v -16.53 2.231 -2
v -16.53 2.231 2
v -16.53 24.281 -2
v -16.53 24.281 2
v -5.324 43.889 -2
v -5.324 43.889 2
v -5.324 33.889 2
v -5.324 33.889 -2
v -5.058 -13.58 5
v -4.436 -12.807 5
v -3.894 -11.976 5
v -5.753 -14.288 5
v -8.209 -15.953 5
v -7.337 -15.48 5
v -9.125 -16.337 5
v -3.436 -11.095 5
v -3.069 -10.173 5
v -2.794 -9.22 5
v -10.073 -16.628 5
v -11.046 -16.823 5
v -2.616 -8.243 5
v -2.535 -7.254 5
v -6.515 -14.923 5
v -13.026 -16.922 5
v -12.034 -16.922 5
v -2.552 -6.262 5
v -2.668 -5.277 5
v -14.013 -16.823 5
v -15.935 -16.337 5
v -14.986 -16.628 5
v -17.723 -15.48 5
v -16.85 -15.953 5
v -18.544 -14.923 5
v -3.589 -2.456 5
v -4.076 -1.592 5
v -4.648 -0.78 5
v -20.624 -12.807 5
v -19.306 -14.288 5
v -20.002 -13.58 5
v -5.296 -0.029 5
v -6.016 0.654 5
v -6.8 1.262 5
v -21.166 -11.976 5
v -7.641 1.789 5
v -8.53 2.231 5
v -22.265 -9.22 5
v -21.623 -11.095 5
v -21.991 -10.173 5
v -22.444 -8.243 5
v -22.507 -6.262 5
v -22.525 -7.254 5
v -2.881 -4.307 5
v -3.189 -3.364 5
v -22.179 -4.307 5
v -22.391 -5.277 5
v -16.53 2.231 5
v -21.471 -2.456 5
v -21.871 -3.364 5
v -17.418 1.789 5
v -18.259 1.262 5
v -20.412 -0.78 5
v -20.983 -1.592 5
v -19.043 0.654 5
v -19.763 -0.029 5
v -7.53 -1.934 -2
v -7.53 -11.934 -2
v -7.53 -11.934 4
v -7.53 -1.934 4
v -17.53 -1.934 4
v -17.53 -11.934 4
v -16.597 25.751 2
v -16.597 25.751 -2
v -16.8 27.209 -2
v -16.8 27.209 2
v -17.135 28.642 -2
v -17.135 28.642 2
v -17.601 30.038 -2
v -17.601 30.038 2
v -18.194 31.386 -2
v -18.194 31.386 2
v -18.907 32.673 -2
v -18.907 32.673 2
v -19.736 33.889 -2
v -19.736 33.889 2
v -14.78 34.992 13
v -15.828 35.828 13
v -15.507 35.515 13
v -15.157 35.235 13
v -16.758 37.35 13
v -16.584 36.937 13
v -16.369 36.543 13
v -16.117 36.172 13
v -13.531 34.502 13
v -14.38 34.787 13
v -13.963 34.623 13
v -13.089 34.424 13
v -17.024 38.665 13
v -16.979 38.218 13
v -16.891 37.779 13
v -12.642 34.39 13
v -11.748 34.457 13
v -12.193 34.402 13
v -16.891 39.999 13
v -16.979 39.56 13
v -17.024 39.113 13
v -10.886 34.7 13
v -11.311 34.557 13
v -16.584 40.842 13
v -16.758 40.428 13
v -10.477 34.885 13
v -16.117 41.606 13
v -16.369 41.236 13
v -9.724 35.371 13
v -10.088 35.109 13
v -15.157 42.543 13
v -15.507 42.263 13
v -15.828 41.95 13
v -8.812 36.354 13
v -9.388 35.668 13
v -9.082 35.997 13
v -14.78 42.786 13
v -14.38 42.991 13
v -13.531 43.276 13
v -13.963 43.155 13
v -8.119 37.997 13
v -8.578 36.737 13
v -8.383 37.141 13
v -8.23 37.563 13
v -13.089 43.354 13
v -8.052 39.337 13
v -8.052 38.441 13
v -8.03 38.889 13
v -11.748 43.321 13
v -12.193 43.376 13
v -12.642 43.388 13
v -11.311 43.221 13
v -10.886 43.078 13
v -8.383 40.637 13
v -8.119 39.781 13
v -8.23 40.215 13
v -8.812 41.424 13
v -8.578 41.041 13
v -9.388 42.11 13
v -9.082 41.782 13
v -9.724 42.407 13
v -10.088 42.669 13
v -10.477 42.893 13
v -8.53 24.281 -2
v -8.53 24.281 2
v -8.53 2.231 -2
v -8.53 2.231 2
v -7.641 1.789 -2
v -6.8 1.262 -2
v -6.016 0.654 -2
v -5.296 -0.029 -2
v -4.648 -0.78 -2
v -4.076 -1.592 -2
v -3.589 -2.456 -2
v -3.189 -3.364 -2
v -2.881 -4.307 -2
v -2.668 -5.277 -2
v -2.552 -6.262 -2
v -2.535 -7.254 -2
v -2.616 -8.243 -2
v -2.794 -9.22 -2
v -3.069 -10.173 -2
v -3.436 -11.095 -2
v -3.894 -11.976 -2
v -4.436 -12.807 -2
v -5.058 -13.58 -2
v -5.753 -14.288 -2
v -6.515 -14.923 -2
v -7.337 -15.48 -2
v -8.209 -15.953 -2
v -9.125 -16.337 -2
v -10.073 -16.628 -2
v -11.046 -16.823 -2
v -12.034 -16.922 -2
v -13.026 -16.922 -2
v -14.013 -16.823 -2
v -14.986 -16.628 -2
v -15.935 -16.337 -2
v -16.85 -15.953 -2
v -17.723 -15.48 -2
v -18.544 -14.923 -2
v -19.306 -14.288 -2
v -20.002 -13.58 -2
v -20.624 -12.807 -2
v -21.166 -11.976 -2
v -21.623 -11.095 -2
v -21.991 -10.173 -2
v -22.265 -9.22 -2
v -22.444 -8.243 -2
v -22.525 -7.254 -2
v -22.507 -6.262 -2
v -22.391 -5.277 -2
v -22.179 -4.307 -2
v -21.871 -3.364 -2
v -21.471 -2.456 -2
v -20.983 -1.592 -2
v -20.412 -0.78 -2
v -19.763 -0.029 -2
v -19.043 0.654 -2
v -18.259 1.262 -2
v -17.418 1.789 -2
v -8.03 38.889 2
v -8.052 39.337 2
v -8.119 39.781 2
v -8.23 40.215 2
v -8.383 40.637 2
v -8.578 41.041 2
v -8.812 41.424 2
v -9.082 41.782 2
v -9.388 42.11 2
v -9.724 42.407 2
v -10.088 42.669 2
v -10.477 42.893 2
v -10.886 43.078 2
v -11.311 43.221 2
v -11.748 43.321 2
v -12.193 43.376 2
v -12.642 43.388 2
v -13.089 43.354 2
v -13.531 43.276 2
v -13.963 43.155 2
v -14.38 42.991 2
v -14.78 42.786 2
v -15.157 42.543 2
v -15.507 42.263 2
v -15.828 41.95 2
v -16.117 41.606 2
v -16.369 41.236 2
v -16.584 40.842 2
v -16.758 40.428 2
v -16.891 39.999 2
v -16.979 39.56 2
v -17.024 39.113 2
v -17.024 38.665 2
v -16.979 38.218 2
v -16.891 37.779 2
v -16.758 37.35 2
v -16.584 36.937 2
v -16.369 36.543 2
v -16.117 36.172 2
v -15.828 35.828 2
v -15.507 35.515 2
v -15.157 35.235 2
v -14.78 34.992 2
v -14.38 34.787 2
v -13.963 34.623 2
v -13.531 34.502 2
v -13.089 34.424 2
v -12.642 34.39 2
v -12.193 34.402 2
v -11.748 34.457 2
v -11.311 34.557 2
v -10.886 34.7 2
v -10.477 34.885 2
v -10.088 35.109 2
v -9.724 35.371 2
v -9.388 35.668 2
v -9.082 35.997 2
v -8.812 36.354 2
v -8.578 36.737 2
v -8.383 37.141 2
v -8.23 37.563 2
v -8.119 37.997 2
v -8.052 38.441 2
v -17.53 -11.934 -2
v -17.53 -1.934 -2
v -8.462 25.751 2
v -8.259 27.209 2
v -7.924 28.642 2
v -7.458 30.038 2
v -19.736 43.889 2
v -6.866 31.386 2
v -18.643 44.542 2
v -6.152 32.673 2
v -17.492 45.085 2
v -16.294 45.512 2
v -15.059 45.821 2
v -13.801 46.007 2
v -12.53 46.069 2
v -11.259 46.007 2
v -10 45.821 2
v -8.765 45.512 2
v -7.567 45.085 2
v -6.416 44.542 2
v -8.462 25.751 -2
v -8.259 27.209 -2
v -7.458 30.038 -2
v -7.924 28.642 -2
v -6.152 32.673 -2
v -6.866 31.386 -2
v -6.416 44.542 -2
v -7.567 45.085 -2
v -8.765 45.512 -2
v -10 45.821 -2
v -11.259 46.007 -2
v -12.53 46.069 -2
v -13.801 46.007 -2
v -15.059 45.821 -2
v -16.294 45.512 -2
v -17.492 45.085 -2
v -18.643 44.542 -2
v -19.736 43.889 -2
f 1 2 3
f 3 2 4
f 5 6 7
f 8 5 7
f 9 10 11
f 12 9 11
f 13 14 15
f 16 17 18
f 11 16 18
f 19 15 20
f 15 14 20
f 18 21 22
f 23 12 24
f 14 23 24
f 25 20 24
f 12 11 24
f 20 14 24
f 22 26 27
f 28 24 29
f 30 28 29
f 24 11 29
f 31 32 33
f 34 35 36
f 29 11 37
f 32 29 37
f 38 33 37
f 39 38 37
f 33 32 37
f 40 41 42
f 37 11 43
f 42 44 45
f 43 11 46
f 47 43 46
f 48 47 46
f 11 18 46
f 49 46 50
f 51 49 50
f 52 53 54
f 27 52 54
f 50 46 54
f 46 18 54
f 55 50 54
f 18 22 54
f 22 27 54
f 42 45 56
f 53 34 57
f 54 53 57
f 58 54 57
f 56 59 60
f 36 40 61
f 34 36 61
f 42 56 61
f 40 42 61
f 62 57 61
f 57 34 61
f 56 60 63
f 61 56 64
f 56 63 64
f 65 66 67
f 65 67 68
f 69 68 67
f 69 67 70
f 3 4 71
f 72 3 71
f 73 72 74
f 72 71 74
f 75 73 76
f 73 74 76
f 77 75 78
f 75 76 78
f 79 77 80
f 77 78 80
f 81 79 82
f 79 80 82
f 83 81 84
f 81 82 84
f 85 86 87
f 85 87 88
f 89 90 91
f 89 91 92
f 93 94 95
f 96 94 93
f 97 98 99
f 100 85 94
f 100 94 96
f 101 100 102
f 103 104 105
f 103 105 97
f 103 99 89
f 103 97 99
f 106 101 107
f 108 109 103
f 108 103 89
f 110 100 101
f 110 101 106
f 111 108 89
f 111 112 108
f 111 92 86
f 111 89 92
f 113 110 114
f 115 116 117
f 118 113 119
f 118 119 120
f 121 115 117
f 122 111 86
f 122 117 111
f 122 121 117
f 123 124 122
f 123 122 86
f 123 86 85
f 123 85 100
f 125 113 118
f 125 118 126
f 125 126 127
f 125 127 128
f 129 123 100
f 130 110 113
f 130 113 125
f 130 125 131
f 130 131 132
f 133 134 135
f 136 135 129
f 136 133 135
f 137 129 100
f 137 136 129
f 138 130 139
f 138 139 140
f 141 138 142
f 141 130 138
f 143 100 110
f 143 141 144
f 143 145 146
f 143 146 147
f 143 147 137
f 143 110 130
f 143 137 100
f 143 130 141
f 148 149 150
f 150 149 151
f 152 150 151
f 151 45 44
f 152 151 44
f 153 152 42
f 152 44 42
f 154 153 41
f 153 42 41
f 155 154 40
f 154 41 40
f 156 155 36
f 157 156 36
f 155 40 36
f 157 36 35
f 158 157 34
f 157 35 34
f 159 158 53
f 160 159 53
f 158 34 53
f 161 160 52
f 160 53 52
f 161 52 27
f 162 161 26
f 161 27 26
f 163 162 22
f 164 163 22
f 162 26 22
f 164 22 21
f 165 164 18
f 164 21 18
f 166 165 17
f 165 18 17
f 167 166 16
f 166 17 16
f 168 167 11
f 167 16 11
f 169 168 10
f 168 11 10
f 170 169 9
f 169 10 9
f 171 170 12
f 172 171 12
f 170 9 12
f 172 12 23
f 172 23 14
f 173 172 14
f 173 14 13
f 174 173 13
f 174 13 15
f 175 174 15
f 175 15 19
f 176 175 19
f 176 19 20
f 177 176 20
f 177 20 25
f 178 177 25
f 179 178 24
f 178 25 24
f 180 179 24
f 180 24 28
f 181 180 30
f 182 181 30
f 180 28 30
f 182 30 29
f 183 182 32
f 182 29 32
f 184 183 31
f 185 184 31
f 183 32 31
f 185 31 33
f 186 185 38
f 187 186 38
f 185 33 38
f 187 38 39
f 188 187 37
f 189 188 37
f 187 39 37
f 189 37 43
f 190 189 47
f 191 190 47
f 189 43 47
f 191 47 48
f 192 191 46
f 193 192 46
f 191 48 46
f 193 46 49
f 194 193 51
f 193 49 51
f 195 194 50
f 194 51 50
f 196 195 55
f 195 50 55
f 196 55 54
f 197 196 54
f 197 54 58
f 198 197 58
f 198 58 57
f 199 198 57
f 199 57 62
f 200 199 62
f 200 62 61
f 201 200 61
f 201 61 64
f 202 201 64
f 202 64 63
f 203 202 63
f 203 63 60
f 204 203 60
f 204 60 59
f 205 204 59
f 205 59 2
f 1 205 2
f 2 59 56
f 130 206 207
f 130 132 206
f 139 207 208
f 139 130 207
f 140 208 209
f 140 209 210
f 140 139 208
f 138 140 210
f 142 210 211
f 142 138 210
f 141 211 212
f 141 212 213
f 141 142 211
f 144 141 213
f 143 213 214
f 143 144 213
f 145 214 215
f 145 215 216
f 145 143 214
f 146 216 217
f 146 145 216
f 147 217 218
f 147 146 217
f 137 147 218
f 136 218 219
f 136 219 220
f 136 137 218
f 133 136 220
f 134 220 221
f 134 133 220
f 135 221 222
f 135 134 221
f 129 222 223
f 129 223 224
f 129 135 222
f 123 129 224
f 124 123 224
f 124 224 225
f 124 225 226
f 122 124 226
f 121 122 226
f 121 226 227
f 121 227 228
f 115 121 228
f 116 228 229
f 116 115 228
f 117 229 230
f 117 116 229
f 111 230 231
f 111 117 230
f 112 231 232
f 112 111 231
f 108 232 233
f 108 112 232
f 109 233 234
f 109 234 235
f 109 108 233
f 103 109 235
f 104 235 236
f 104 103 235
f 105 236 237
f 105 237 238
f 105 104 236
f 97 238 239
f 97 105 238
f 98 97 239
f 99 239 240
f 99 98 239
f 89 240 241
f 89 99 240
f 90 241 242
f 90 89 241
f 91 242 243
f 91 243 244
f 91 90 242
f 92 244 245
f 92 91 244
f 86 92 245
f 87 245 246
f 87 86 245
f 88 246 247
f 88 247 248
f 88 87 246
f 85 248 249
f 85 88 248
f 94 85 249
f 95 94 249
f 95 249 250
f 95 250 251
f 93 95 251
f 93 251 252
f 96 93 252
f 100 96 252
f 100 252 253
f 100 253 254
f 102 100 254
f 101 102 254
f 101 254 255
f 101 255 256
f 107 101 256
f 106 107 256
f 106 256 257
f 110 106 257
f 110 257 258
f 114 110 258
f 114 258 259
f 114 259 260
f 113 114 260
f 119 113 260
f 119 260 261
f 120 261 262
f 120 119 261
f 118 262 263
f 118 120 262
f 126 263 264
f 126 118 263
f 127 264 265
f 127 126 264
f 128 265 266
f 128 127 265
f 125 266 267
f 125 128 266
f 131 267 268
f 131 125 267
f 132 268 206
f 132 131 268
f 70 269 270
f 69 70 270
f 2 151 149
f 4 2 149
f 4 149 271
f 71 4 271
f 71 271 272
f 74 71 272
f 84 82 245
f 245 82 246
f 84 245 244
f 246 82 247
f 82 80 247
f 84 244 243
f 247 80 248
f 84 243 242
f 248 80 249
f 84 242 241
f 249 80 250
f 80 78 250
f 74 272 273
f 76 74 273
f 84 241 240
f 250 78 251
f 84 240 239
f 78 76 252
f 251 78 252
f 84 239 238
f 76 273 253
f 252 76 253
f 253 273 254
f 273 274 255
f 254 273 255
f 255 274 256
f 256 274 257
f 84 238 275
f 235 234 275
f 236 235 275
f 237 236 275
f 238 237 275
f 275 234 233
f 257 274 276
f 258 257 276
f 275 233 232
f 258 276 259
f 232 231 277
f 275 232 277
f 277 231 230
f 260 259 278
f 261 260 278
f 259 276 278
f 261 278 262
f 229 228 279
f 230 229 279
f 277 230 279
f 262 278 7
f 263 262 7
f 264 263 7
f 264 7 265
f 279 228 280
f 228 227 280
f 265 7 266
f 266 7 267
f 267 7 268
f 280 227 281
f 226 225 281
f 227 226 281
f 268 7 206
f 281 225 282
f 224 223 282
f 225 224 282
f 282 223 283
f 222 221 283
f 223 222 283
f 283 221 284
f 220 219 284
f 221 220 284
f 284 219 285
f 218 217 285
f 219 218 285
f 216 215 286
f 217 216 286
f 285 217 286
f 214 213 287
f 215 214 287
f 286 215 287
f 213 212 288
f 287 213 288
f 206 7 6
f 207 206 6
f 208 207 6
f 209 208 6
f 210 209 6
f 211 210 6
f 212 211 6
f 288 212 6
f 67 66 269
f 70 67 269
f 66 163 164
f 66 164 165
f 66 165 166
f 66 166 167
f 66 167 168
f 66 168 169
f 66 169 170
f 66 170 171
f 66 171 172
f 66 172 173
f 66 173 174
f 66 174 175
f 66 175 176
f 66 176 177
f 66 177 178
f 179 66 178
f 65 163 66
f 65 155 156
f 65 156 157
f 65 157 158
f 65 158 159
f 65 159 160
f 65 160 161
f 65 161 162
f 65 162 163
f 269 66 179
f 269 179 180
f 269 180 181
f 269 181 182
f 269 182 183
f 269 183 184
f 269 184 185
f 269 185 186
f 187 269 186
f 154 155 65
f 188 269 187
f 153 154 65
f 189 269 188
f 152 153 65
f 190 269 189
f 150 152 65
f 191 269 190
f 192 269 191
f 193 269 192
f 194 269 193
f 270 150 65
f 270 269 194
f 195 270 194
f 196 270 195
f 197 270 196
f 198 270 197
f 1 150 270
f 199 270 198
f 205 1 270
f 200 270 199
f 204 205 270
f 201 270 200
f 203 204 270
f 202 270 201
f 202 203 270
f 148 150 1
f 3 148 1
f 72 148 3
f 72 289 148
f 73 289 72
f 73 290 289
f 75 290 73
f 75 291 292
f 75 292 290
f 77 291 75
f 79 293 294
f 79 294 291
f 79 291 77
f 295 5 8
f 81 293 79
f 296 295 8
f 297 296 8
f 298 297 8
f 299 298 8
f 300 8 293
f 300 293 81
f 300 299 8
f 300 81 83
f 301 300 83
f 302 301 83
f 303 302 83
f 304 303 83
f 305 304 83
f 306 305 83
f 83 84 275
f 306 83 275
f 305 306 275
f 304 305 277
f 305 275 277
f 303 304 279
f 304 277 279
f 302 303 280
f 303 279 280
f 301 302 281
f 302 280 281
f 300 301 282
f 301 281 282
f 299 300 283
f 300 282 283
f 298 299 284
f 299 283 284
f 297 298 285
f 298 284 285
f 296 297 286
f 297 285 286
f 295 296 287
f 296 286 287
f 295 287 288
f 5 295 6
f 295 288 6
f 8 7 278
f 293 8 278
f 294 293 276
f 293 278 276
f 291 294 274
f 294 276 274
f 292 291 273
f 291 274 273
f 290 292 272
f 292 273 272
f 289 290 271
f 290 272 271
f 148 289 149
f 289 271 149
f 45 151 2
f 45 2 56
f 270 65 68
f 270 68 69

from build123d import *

# Parameters (mm, degrees)
ESTRUSIONE_ESTRUSIONE1_DEPTH      = 5
ESTRUSIONE_ESTRUSIONE1_DEPTH_BACK = 2
SCHIZZO4_R                        = 4.5
ESTRUSIONE_ESTRUSIONE3_DEPTH      = 8
SCHIZZO5_W                        = 10
SCHIZZO5_H                        = 10
TAGLIO_ESTRUSIONE1_DEPTH          = 6
SCHIZZO6_W                        = 5.883874728
SCHIZZO6_H                        = 31.765714376
TAGLIO_ESTRUSIONE3_DEPTH          = 15
TAGLIO_ESTRUSIONE3_DEPTH_BACK     = 15
SCHIZZO7_R                        = 4.5
TAGLIO_ESTRUSIONE4_DEPTH          = 3


with BuildPart() as part:
    # Schizzo1 → Estrusione-Estrusione1 (new body, two sides)
    with BuildSketch(Plane.XY) as estrusione_estrusione1_sk:
        with BuildLine():
            Line((-19.735743023, 33.889071348), (-19.735743023, 43.889071348))
            ThreePointArc((-19.735743023, 43.889071348), (-12.529677135, 46.069061439), (-5.323611247, 43.889071348))
            Line((-5.323611247, 43.889071348), (-5.323611247, 33.889071348))
            ThreePointArc((-5.323611247, 33.889071348), (-7.707011318, 29.345426307), (-8.529677135, 24.280988816))
            Line((-8.529677135, 24.280988816), (-8.529677135, 2.230988816))
            ThreePointArc((-8.529677135, 2.230988816), (-12.529677135, -16.934162574), (-16.529677135, 2.230988816))
            Line((-16.529677135, 2.230988816), (-16.529677135, 24.280988816))
            ThreePointArc((-16.529677135, 24.280988816), (-17.352342952, 29.345426307), (-19.735743023, 33.889071348))
        make_face()
    extrude(amount=ESTRUSIONE_ESTRUSIONE1_DEPTH)
    extrude(estrusione_estrusione1_sk.sketch, amount=-ESTRUSIONE_ESTRUSIONE1_DEPTH_BACK)

    # Schizzo4 → Estrusione-Estrusione3 (add)
    with BuildSketch(Plane.XY.offset(5)):
        with Locations((-12.529677135, 38.889071348)):
            Circle(SCHIZZO4_R)
    extrude(amount=ESTRUSIONE_ESTRUSIONE3_DEPTH)

    # Schizzo5 → Taglio-Estrusione1 (cut)
    with BuildSketch(Plane(origin=(0, 0, -2), x_dir=(-1, 0, 0), z_dir=(0, 0, -1))):
        with Locations((12.529677135, -6.934162574)):
            Rectangle(SCHIZZO5_W, SCHIZZO5_H)
    extrude(amount=-TAGLIO_ESTRUSIONE1_DEPTH, mode=Mode.SUBTRACT)

    # Schizzo6 → Taglio-Estrusione3 (cut, two sides)
    with BuildSketch(Plane.ZY.offset(16.529677135)) as taglio_estrusione3_sk:
        with Locations((4.941937364, 18.113846004)):
            Rectangle(SCHIZZO6_W, SCHIZZO6_H)
    extrude(amount=TAGLIO_ESTRUSIONE3_DEPTH, mode=Mode.SUBTRACT)
    extrude(taglio_estrusione3_sk.sketch, amount=-TAGLIO_ESTRUSIONE3_DEPTH_BACK, mode=Mode.SUBTRACT)

    # Schizzo7 → Taglio-Estrusione4 (cut)
    with BuildSketch(Plane.XY.offset(5)):
        Polygon((-26.342217031, 45.266793591), (-24.610237107, 33.489330106), (-19.735743023, 33.889071348), (-1.055310137, 33.889071348), (-1.98835975, 45.266793591), (-13.868873062, 49.75887888), align=None)
        with Locations((-12.529677135, 38.889071348)):
            Circle(SCHIZZO7_R, mode=Mode.SUBTRACT)
    extrude(amount=-TAGLIO_ESTRUSIONE4_DEPTH, mode=Mode.SUBTRACT)


solid = part.part
